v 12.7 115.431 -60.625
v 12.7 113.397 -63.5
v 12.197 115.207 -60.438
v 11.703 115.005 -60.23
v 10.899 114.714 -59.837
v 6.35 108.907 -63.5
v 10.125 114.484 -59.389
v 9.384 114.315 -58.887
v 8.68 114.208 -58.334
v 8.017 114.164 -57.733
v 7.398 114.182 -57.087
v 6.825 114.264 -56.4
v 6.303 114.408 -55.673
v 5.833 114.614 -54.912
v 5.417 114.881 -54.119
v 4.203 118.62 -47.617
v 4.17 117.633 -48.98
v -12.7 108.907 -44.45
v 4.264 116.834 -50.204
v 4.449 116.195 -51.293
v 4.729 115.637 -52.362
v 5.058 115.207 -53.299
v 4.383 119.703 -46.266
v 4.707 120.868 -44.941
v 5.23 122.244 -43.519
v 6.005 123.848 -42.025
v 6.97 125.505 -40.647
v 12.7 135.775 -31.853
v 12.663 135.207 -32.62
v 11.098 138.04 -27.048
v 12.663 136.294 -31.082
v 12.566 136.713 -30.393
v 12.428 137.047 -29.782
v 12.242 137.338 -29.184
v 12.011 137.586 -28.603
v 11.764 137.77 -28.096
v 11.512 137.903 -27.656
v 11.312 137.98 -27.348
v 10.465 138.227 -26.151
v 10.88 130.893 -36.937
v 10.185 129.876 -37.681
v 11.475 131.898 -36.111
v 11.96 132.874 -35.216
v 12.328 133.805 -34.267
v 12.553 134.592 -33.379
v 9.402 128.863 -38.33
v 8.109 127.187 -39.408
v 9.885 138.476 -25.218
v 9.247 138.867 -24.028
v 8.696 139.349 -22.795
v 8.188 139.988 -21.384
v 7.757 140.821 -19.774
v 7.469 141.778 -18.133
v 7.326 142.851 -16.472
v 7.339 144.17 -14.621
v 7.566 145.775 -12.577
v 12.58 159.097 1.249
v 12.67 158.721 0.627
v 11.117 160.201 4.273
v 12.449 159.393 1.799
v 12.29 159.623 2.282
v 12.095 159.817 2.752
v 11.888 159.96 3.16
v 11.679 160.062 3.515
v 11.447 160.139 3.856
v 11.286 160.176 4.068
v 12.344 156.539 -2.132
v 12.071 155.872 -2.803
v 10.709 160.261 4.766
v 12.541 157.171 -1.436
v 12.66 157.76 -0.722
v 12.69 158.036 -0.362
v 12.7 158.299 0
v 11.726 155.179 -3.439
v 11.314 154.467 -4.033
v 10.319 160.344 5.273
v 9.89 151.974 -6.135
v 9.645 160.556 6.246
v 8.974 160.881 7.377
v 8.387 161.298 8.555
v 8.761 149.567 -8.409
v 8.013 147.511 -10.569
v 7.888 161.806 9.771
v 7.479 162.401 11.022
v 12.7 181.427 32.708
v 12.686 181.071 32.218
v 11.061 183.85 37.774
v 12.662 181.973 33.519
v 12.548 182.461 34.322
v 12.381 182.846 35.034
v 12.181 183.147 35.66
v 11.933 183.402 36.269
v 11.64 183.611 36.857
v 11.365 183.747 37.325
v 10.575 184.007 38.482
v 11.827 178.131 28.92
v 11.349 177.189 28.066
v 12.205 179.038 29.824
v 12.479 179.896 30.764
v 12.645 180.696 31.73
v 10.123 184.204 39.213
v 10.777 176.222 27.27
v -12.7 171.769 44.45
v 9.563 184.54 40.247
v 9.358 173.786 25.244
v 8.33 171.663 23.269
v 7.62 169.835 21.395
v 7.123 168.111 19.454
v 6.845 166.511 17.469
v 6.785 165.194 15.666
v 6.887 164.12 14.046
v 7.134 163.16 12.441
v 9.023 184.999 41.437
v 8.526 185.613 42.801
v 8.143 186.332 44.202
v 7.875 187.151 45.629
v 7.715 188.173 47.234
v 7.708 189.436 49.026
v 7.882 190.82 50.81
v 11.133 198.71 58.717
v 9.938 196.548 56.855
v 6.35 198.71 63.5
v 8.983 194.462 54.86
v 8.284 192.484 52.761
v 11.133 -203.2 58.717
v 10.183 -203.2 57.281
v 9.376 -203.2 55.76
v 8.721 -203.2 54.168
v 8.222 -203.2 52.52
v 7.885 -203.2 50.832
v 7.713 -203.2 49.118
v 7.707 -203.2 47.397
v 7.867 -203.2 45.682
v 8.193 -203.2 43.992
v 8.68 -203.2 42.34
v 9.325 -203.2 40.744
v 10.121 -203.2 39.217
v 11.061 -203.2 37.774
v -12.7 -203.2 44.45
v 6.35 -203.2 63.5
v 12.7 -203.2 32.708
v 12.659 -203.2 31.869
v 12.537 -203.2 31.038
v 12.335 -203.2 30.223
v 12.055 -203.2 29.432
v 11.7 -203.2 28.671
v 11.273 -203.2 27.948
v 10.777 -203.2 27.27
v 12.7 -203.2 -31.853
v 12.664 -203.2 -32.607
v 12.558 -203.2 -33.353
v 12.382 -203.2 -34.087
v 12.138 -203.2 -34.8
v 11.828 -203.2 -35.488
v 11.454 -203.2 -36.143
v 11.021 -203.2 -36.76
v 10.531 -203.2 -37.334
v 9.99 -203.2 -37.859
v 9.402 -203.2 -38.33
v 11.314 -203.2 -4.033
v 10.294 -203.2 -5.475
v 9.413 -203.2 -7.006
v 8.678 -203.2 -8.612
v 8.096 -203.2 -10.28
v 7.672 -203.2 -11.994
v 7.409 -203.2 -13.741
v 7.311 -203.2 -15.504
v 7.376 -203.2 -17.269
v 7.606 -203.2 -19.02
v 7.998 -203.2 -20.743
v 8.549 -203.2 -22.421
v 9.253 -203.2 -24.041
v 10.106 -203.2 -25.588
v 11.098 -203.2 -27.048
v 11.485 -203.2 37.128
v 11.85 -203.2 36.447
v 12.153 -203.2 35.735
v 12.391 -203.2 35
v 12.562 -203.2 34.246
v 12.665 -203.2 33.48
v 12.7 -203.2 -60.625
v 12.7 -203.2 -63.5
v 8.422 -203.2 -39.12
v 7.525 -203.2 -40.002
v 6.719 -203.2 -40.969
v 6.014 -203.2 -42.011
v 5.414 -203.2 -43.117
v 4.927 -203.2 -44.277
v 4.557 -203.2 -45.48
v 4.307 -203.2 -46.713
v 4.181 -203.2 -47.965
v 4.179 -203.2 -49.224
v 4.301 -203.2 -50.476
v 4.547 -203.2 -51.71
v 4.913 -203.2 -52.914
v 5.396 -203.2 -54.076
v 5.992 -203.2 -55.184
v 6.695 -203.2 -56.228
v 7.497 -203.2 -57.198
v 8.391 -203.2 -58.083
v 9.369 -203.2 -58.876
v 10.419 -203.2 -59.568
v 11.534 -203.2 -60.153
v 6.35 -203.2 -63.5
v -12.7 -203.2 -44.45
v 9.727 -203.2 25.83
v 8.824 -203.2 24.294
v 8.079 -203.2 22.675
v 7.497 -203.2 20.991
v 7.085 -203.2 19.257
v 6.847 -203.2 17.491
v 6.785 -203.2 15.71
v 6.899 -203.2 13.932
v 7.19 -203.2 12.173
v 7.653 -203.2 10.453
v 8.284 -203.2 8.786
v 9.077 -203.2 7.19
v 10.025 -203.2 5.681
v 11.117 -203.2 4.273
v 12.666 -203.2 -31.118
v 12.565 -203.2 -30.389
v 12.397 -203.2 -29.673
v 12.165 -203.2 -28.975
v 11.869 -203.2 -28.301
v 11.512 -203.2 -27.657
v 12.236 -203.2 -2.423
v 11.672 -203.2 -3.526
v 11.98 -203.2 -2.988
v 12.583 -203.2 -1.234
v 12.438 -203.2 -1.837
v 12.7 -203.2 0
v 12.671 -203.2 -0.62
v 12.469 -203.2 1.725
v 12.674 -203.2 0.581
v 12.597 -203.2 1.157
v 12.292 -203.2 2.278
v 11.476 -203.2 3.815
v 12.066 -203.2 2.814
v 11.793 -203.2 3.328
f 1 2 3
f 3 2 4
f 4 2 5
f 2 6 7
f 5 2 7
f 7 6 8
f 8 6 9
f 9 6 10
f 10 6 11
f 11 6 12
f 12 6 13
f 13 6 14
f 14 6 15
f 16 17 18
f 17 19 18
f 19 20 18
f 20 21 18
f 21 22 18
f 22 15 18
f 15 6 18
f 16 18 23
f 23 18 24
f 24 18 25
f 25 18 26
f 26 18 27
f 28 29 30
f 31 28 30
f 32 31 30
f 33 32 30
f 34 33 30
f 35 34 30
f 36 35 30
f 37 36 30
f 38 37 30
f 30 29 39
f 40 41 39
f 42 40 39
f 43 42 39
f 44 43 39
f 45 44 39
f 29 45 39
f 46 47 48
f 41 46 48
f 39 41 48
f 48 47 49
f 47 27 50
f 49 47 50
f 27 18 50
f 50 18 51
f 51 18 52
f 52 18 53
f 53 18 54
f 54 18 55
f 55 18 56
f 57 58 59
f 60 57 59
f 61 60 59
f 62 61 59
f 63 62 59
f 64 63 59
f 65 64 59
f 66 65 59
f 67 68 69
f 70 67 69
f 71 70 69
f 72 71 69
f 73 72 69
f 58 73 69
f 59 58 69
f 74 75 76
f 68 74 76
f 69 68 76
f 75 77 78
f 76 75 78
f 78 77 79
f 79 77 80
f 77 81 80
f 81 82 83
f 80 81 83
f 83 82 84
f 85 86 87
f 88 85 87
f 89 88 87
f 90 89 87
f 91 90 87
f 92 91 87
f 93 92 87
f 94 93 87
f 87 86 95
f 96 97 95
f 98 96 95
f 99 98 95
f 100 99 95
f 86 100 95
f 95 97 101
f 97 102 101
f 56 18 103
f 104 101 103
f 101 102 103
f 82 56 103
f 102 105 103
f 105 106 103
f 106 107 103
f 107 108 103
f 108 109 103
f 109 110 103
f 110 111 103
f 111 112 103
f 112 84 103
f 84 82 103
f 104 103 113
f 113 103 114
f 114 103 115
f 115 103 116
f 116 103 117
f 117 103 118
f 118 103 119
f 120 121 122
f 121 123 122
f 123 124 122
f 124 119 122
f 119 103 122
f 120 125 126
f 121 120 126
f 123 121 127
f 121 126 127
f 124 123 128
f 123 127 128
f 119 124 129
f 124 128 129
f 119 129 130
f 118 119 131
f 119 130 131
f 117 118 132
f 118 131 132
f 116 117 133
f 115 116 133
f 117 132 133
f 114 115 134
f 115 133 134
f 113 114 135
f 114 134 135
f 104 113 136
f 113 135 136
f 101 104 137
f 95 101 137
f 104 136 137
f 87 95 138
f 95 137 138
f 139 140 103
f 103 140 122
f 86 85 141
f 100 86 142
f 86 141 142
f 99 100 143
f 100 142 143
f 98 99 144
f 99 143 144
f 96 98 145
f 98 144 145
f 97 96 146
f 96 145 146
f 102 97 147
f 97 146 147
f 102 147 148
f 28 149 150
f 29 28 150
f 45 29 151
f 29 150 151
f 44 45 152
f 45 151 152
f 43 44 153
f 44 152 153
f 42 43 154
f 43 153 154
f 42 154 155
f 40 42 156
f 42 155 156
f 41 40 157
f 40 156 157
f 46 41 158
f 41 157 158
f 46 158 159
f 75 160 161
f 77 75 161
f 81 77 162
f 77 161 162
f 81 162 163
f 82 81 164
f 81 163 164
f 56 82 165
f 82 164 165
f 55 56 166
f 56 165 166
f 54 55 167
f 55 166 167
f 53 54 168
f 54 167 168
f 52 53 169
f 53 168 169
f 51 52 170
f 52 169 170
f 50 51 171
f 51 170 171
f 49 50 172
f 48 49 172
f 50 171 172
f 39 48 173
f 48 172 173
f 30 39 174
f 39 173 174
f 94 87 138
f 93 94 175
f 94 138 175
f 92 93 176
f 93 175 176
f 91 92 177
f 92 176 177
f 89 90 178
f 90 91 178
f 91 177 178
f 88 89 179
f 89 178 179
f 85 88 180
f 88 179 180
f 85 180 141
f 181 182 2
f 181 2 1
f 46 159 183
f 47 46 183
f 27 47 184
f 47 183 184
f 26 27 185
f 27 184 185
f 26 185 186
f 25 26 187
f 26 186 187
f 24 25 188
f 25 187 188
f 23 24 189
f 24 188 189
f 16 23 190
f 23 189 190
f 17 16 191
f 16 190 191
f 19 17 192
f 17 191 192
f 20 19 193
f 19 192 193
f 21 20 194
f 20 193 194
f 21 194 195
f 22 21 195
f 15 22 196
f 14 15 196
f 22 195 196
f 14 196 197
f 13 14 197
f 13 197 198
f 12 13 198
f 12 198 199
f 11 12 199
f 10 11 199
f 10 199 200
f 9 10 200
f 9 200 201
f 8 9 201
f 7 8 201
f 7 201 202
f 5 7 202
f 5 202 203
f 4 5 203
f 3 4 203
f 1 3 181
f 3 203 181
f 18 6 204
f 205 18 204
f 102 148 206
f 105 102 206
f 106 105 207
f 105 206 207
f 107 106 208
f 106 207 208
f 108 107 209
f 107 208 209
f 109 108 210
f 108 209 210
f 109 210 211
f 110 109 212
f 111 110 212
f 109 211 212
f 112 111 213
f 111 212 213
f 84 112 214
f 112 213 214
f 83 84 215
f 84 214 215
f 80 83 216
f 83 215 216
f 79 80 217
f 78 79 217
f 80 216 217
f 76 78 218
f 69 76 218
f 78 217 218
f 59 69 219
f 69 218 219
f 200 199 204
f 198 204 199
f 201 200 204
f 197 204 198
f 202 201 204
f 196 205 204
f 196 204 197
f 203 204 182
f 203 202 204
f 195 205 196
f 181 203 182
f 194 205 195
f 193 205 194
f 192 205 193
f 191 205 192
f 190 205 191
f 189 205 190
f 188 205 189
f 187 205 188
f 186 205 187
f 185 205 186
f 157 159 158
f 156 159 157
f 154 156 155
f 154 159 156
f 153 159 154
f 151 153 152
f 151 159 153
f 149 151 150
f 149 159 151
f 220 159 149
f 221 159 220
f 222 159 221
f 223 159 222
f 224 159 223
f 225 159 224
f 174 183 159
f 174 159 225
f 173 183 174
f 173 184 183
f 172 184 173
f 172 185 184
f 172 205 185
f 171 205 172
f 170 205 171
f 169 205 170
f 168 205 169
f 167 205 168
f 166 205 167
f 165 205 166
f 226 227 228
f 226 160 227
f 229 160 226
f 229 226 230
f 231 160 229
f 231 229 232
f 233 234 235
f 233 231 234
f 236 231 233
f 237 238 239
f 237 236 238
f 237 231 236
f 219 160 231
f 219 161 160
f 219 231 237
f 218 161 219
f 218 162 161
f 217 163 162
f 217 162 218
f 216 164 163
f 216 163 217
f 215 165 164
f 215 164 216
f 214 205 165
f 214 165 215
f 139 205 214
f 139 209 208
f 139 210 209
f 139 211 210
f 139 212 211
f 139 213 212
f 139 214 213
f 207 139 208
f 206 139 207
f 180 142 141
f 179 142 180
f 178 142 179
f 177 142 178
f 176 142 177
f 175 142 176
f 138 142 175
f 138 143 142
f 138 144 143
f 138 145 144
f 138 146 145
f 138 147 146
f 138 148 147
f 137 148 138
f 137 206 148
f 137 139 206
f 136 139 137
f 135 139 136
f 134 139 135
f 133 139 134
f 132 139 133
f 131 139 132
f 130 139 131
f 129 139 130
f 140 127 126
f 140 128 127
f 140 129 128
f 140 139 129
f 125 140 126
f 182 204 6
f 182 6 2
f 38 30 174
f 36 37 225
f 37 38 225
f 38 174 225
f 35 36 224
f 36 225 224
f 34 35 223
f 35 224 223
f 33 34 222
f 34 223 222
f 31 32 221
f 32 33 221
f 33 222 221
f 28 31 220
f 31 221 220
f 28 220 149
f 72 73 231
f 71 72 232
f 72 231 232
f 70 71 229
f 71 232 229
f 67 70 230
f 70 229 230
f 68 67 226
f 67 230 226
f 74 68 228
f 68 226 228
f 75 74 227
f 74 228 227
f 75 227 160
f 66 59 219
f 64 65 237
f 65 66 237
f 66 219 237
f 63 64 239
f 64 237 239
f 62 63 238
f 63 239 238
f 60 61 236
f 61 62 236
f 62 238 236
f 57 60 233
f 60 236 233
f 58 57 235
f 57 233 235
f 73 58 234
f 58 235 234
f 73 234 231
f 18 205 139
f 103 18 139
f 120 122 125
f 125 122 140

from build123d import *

# Parameters (mm, degrees)
F0_W     = 25.4
F0_H     = 127
F1_DEPTH = 203.2
F2_SIZE  = 19.05
F4_DEPTH = 406.401
F6_DEPTH = 94.293689


with BuildPart() as f1:
    # F0 (on Front) → F1 (new body, symmetric)
    with BuildSketch(Plane.XZ):
        Rectangle(F0_W, F0_H)
    extrude(amount=F1_DEPTH, both=True)

    # F2
    f2_edges = [f1.edges().sort_by_distance(p)[0] for p in [
        (-12.7, 0, 63.5),
        (-12.7, 0, -63.5),
    ]]
    chamfer(f2_edges, length=F2_SIZE)

    # F3 (on face) → F4 (cut, through all)
    with BuildSketch(Plane.XZ.offset(203.2)):
        with BuildLine():
            ThreePointArc((11.060744, 37.774344), (12.279988, 35.370372), (12.7, 32.707811))
            Line((12.7, 32.707811), (12.7, 60.574245))
            ThreePointArc((12.7, 60.574245), (7.734522, 49.472371), (11.060744, 37.774344))
        make_face()
        with BuildLine():
            ThreePointArc((12.7, 32.707811), (12.205083, 29.823985), (10.776971, 27.270186))
            ThreePointArc((10.776971, 27.270186), (6.784667, 15.709988), (11.117322, 4.272996))
            ThreePointArc((11.117322, 4.272996), (12.291618, 2.278342), (12.7, 0))
            Line((12.7, 0), (12.7, 32.707811))
        make_face()
        with BuildLine():
            Line((12.7, -31.853333), (12.7, 0))
            ThreePointArc((12.7, 0), (12.343759, -2.132292), (11.313729, -4.03298))
            ThreePointArc((11.313729, -4.03298), (7.310588, -15.504261), (11.098474, -27.048409))
            ThreePointArc((11.098474, -27.048409), (12.289076, -29.320934), (12.7, -31.853333))
        make_face()
        with BuildLine():
            Line((12.7, -60.624816), (12.7, -31.853333))
            ThreePointArc((12.7, -31.853333), (11.827932, -35.487574), (9.401646, -38.330346))
            ThreePointArc((9.401646, -38.330346), (4.3012, -50.476153), (12.7, -60.624816))
        make_face()
    extrude(amount=-F4_DEPTH, mode=Mode.SUBTRACT)

    # F5 (on face) → F6 (cut, through all)
    with BuildSketch(Plane(origin=(-28.575, 0, 28.575), x_dir=(0, -1, 0), z_dir=(-0.707107, 0, 0.707107))):
        Polygon((203.2, 53.881537), (-203.2, 53.881537), (-198.709872, 49.391409), (203.2, 49.391409), align=None)
        Polygon((-198.709872, 49.391409), (-203.2, 53.881537), (-203.2, 49.391409), align=None)
        Polygon((-198.709872, 49.391409), (-203.2, 49.391409), (-203.2, -78.467675), (-70.850788, -78.467675), align=None)
    extrude(amount=-F6_DEPTH, mode=Mode.SUBTRACT)


solid = f1.part
